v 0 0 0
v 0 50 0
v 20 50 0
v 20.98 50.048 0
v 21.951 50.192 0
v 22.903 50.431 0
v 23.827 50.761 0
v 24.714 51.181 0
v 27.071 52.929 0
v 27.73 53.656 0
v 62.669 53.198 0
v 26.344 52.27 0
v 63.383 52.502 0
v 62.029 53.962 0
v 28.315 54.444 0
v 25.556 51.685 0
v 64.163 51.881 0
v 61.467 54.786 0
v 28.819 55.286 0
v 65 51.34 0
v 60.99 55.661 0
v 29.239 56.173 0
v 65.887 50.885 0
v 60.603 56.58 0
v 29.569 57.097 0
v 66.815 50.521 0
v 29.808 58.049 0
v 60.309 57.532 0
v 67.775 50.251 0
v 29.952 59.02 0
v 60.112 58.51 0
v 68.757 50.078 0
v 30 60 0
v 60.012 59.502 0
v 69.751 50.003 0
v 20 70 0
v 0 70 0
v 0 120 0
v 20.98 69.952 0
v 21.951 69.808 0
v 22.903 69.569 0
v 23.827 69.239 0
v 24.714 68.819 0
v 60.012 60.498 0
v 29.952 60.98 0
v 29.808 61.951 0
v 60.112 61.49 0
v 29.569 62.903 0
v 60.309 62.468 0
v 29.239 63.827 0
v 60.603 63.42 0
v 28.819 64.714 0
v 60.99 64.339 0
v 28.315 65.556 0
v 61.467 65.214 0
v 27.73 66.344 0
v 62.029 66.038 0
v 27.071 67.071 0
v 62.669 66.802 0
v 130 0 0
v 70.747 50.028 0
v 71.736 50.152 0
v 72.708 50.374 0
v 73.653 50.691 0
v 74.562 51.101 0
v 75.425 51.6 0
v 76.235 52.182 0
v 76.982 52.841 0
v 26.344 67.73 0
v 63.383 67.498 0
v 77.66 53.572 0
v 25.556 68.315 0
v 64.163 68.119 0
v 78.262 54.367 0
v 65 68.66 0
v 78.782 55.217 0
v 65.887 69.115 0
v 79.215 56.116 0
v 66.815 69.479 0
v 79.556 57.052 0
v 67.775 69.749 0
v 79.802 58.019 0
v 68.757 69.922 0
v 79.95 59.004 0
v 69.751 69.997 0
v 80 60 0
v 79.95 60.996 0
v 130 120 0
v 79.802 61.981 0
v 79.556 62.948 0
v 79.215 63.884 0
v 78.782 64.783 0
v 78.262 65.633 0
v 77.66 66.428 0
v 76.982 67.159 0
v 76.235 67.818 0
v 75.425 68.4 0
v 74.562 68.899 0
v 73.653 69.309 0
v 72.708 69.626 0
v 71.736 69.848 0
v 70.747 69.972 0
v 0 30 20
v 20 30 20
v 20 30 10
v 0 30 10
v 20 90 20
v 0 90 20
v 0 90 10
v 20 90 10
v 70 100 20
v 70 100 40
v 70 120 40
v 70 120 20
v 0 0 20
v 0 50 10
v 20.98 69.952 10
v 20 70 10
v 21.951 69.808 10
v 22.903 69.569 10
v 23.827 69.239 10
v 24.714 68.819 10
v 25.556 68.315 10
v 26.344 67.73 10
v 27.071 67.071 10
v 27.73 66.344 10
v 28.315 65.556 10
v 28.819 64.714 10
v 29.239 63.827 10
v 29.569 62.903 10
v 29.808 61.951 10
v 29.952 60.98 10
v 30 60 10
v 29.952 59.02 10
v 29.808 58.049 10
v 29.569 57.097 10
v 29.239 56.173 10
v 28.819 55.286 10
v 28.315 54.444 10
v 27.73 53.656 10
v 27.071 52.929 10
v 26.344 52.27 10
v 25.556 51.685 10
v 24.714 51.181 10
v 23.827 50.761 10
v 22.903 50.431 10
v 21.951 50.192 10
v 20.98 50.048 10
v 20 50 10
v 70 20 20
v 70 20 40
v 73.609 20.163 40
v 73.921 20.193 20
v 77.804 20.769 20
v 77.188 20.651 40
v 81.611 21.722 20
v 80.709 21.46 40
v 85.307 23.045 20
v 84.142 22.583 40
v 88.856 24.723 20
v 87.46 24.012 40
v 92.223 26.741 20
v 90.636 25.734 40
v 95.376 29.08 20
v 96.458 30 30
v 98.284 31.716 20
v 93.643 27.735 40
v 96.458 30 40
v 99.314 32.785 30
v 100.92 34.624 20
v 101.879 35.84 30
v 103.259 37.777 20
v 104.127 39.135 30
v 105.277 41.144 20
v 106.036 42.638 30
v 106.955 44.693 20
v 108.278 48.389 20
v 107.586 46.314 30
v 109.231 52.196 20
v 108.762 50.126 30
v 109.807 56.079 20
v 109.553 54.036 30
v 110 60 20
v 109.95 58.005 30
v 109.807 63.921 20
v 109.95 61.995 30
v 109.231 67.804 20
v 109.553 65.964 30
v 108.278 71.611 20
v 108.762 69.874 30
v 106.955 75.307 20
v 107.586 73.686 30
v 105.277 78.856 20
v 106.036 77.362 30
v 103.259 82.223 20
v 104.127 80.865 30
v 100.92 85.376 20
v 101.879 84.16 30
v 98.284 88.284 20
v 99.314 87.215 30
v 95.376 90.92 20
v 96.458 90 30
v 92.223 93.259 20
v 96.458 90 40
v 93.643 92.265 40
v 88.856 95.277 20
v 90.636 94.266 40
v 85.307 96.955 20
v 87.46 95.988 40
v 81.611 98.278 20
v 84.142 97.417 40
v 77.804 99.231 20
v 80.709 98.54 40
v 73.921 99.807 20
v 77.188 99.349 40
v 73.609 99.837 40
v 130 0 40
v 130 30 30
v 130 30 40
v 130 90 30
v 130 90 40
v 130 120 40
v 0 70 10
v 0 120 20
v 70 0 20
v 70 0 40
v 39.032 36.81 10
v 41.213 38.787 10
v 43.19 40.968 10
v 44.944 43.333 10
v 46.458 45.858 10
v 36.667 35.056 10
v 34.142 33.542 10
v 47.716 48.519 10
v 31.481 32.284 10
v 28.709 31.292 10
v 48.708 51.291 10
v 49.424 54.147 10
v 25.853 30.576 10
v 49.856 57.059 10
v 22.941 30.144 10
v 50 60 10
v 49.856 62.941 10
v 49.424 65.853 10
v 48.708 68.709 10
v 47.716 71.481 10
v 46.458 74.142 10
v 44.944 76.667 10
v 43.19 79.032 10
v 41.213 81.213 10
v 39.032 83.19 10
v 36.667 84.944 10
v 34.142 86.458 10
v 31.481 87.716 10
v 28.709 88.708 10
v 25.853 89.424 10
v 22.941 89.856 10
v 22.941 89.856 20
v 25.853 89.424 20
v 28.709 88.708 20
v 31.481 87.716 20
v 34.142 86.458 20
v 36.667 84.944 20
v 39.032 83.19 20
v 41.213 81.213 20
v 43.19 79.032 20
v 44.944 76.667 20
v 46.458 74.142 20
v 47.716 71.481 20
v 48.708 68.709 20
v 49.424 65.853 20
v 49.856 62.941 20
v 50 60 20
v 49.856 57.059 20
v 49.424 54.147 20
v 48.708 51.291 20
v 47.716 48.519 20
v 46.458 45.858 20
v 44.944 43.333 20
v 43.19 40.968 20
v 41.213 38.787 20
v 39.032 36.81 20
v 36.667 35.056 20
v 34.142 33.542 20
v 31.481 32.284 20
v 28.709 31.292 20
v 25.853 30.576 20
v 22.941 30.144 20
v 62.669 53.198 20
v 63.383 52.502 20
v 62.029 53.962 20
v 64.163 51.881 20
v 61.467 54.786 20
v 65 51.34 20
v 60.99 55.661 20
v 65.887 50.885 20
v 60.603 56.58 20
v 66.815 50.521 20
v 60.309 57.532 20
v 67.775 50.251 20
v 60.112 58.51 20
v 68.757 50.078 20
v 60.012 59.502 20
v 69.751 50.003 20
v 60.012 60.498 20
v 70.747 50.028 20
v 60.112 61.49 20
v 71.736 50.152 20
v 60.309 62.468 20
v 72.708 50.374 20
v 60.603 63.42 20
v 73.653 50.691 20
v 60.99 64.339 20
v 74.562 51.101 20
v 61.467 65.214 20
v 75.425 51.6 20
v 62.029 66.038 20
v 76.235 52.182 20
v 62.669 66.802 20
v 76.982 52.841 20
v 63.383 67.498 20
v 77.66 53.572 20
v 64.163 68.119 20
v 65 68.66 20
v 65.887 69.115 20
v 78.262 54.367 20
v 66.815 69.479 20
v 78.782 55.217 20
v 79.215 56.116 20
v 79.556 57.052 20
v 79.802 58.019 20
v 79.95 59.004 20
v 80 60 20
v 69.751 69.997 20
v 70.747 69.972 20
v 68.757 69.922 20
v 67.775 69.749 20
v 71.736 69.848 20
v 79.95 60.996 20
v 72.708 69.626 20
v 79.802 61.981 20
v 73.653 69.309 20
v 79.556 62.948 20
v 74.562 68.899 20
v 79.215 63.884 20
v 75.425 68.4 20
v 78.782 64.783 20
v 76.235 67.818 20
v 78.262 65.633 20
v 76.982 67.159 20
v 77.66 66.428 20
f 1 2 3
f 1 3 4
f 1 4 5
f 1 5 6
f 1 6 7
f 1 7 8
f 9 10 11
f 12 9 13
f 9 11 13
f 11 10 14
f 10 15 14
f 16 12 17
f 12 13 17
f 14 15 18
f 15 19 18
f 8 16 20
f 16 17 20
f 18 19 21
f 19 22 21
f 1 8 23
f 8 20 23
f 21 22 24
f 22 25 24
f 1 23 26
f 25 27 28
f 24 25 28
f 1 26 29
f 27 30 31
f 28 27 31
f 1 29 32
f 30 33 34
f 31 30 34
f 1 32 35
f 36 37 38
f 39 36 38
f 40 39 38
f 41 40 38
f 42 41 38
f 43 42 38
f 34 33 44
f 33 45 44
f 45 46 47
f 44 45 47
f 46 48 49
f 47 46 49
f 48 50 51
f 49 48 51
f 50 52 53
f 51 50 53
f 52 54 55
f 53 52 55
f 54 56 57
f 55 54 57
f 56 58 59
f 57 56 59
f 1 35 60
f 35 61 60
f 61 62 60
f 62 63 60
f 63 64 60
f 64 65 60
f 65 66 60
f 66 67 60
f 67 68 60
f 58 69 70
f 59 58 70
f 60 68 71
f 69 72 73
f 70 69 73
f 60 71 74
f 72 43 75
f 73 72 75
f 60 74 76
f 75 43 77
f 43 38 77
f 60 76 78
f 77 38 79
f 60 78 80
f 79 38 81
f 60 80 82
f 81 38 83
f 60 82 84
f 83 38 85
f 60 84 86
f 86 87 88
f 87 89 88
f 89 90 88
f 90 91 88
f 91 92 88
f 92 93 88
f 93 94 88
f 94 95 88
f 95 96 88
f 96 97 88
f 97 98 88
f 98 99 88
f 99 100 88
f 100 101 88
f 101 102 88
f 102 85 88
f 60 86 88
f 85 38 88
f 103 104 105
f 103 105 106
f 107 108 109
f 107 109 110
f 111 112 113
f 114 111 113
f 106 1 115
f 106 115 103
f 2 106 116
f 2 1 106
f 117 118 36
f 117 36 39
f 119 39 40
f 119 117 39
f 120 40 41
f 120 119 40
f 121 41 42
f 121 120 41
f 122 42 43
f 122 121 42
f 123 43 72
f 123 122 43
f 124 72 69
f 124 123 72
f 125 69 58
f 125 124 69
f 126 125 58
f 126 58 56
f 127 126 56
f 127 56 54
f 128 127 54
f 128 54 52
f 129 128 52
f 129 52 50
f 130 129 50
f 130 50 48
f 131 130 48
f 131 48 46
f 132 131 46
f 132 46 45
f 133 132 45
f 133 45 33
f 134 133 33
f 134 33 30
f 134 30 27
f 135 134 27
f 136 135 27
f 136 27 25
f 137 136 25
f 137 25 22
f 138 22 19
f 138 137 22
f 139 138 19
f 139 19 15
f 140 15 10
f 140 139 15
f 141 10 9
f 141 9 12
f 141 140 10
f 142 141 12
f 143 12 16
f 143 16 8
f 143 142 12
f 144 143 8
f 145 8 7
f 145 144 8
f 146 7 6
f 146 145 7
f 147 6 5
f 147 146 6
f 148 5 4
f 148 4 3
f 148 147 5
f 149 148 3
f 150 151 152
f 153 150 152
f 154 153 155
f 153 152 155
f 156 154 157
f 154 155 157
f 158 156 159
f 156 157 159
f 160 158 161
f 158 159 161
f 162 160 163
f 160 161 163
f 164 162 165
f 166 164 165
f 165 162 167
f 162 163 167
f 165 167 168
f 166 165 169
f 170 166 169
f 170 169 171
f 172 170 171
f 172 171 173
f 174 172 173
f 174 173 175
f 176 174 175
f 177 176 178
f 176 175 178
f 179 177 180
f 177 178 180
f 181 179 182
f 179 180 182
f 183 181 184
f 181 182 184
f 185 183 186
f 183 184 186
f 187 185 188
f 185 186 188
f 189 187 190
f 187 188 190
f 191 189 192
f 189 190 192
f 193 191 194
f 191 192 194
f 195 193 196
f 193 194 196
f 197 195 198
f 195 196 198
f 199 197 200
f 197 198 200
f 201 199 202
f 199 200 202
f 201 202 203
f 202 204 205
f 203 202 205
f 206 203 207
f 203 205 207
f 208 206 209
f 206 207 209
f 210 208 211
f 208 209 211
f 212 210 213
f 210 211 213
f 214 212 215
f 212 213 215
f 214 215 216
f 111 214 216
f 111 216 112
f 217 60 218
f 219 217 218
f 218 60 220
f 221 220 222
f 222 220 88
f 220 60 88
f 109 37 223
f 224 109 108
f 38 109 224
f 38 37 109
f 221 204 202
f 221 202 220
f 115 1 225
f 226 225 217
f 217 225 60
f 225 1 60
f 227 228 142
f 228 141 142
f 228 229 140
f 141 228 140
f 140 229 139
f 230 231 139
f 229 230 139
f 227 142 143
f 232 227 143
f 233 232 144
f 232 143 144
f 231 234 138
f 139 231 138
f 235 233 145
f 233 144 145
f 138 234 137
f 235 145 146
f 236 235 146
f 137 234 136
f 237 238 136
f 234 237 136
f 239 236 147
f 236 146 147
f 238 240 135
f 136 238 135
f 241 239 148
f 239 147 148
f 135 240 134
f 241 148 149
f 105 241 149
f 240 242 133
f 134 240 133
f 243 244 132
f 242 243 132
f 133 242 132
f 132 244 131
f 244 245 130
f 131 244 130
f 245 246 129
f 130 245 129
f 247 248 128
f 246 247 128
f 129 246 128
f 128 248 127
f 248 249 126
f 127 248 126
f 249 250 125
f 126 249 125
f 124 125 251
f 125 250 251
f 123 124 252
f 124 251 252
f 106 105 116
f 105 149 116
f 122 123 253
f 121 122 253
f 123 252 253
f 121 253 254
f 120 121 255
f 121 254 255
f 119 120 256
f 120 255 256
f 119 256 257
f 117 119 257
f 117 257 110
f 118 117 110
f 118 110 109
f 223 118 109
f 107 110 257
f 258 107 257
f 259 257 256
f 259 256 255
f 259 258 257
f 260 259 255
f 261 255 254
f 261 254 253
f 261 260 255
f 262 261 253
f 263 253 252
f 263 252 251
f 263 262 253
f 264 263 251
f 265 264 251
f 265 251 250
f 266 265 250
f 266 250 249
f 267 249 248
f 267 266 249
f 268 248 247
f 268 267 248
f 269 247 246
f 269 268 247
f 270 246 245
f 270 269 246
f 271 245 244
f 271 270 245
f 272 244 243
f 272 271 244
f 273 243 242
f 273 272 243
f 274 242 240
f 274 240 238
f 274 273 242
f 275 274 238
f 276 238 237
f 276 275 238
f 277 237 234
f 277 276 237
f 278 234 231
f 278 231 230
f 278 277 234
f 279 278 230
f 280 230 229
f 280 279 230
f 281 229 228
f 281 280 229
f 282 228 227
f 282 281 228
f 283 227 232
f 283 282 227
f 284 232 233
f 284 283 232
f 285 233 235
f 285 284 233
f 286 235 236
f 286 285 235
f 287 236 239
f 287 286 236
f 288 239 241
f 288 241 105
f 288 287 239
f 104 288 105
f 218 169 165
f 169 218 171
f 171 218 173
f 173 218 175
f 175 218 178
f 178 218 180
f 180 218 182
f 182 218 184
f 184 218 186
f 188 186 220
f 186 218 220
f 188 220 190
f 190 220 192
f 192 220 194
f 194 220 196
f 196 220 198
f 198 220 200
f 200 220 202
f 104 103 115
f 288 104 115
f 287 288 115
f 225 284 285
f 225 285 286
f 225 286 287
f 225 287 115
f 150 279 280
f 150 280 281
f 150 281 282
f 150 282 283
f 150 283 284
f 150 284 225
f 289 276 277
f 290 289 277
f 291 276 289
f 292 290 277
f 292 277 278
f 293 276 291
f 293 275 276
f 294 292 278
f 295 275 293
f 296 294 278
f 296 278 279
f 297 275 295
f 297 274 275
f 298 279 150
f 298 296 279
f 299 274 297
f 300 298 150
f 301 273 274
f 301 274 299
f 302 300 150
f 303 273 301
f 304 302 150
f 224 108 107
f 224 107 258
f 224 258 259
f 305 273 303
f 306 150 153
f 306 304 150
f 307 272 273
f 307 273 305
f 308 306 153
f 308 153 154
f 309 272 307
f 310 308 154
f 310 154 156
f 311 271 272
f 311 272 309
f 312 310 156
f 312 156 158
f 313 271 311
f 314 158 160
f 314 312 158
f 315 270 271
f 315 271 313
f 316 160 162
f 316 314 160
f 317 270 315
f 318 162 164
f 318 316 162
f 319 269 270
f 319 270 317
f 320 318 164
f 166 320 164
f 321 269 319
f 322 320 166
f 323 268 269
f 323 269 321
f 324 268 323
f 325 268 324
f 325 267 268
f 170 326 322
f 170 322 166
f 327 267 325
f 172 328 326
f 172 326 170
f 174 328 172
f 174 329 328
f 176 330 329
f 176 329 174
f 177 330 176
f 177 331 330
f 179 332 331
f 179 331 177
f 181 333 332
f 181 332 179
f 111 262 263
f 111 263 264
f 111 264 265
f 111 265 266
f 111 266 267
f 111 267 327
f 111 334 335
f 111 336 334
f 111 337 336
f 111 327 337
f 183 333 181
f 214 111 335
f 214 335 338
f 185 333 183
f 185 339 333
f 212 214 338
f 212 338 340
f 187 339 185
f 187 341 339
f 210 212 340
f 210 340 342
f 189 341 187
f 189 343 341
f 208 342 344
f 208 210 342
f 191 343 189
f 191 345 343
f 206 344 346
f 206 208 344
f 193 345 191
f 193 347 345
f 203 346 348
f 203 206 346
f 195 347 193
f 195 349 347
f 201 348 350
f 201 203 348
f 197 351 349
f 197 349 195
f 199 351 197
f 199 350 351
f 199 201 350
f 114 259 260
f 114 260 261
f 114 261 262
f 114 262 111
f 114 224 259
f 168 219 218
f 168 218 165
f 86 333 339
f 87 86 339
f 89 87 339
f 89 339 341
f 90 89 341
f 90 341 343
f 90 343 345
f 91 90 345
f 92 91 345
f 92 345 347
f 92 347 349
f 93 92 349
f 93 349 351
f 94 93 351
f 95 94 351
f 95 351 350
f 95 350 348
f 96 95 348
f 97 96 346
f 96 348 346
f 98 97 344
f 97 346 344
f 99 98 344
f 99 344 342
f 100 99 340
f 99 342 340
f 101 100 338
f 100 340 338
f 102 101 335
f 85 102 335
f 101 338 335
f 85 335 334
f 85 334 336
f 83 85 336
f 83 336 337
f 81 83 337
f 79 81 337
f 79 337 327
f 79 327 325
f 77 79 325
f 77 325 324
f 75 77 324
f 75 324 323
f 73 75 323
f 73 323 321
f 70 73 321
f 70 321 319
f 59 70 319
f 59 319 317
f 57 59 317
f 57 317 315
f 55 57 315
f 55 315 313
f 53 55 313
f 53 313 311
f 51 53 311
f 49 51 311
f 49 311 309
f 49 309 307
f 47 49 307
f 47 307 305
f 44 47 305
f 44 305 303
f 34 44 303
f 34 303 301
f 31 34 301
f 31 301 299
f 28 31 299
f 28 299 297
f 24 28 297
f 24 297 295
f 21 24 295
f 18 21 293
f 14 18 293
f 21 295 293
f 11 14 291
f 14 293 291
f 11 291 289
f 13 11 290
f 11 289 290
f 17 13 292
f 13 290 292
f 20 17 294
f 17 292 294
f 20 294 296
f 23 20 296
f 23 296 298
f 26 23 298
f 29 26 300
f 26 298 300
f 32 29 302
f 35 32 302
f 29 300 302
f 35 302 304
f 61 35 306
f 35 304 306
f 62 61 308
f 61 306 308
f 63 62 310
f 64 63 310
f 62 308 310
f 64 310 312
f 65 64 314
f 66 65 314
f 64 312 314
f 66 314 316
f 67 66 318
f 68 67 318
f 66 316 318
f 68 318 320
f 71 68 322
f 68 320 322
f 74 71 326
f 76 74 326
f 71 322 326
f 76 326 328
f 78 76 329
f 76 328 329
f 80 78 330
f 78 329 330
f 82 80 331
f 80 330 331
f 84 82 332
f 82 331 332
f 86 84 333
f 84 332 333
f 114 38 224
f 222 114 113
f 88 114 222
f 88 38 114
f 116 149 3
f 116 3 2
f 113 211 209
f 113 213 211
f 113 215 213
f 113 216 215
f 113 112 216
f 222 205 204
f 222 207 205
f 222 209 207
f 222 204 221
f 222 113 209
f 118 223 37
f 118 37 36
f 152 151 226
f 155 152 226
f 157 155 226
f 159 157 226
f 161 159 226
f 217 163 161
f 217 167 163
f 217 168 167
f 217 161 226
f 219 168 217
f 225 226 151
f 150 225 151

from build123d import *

# Parameters (mm, degrees)
SKETCH1_W           = 130
SKETCH1_H           = 120
BOSS_EXTRUDE1_DEPTH = 40
CUT_EXTRUDE1_DEPTH  = 40
CUT_EXTRUDE2_DEPTH  = 10
SKETCH4_R           = 10
CUT_EXTRUDE4_DEPTH  = 159
CUT_EXTRUDE5_DEPTH  = 20
SKETCH7_R           = 10
CUT_EXTRUDE6_DEPTH  = 20
CUT_EXTRUDE7_DEPTH  = 10


with BuildPart() as part:
    # Sketch1 → Boss-Extrude1 (new body)
    with BuildSketch(Plane.XY):
        with Locations((65, 60)):
            Rectangle(SKETCH1_W, SKETCH1_H)
    extrude(amount=BOSS_EXTRUDE1_DEPTH)

    # Sketch2 → Cut-Extrude1 (cut)
    with BuildSketch(Plane.XY.offset(40)):
        with BuildLine():
            Line((0, 70), (20, 70))
            ThreePointArc((20, 70), (30, 60), (20, 50))
            Line((20, 50), (0, 50))
            Line((0, 50), (0, 70))
        make_face()
    extrude(amount=-CUT_EXTRUDE1_DEPTH, mode=Mode.SUBTRACT)

    # Sketch3 → Cut-Extrude2 (cut)
    with BuildSketch(Plane.XY.offset(40)):
        with BuildLine():
            Line((20, 90), (0, 90))
            Line((0, 90), (0, 70))
            Line((0, 70), (20, 70))
            ThreePointArc((20, 70), (30, 60), (20, 50))
            Line((20, 50), (0, 50))
            Line((0, 50), (0, 30))
            Line((0, 30), (20, 30))
            ThreePointArc((20, 30), (50, 60), (20, 90))
        make_face()
    extrude(amount=-CUT_EXTRUDE2_DEPTH, mode=Mode.SUBTRACT)

    # Sketch4 → Cut-Extrude4 (cut)
    with BuildSketch(Plane.XY.offset(40)):
        with Locations((70, 60)):
            Circle(SKETCH4_R)
    extrude(amount=-CUT_EXTRUDE4_DEPTH, mode=Mode.SUBTRACT)

    # Sketch6 → Cut-Extrude5 (cut)
    with BuildSketch(Plane.XY.offset(30)):
        with BuildLine():
            Line((0, 90), (20, 90))
            ThreePointArc((20, 90), (50, 60), (20, 30))
            Line((20, 30), (0, 30))
            Line((0, 30), (0, 50))
            Line((0, 50), (20, 50))
            ThreePointArc((20, 50), (30, 60), (20, 70))
            Line((20, 70), (0, 70))
            Line((0, 70), (0, 90))
        make_face()
    extrude(amount=-CUT_EXTRUDE5_DEPTH, mode=Mode.SUBTRACT)

    # Sketch7 → Cut-Extrude6 (cut)
    with BuildSketch(Plane.XY.offset(40)):
        with BuildLine():
            Line((0, 120), (0, 90))
            Line((0, 90), (20, 90))
            ThreePointArc((20, 90), (50, 60), (20, 30))
            Line((20, 30), (0, 30))
            Line((0, 30), (0, 0))
            Line((0, 0), (70, 0))
            Line((70, 0), (70, 20))
            ThreePointArc((70, 20), (110, 60), (70, 100))
            Line((70, 100), (70, 120))
            Line((70, 120), (0, 120))
        make_face()
        with Locations((70, 60)):
            Circle(SKETCH7_R, mode=Mode.SUBTRACT)
    extrude(amount=-CUT_EXTRUDE6_DEPTH, mode=Mode.SUBTRACT)

    # Sketch8 → Cut-Extrude7 (cut)
    with BuildSketch(Plane.XY.offset(40)):
        with BuildLine():
            Line((96.457513111, 90), (130, 90))
            Line((130, 90), (130, 30))
            Line((130, 30), (96.457513111, 30))
            ThreePointArc((96.457513111, 30), (110, 60), (96.457513111, 90))
        make_face()
    extrude(amount=-CUT_EXTRUDE7_DEPTH, mode=Mode.SUBTRACT)


solid = part.part
